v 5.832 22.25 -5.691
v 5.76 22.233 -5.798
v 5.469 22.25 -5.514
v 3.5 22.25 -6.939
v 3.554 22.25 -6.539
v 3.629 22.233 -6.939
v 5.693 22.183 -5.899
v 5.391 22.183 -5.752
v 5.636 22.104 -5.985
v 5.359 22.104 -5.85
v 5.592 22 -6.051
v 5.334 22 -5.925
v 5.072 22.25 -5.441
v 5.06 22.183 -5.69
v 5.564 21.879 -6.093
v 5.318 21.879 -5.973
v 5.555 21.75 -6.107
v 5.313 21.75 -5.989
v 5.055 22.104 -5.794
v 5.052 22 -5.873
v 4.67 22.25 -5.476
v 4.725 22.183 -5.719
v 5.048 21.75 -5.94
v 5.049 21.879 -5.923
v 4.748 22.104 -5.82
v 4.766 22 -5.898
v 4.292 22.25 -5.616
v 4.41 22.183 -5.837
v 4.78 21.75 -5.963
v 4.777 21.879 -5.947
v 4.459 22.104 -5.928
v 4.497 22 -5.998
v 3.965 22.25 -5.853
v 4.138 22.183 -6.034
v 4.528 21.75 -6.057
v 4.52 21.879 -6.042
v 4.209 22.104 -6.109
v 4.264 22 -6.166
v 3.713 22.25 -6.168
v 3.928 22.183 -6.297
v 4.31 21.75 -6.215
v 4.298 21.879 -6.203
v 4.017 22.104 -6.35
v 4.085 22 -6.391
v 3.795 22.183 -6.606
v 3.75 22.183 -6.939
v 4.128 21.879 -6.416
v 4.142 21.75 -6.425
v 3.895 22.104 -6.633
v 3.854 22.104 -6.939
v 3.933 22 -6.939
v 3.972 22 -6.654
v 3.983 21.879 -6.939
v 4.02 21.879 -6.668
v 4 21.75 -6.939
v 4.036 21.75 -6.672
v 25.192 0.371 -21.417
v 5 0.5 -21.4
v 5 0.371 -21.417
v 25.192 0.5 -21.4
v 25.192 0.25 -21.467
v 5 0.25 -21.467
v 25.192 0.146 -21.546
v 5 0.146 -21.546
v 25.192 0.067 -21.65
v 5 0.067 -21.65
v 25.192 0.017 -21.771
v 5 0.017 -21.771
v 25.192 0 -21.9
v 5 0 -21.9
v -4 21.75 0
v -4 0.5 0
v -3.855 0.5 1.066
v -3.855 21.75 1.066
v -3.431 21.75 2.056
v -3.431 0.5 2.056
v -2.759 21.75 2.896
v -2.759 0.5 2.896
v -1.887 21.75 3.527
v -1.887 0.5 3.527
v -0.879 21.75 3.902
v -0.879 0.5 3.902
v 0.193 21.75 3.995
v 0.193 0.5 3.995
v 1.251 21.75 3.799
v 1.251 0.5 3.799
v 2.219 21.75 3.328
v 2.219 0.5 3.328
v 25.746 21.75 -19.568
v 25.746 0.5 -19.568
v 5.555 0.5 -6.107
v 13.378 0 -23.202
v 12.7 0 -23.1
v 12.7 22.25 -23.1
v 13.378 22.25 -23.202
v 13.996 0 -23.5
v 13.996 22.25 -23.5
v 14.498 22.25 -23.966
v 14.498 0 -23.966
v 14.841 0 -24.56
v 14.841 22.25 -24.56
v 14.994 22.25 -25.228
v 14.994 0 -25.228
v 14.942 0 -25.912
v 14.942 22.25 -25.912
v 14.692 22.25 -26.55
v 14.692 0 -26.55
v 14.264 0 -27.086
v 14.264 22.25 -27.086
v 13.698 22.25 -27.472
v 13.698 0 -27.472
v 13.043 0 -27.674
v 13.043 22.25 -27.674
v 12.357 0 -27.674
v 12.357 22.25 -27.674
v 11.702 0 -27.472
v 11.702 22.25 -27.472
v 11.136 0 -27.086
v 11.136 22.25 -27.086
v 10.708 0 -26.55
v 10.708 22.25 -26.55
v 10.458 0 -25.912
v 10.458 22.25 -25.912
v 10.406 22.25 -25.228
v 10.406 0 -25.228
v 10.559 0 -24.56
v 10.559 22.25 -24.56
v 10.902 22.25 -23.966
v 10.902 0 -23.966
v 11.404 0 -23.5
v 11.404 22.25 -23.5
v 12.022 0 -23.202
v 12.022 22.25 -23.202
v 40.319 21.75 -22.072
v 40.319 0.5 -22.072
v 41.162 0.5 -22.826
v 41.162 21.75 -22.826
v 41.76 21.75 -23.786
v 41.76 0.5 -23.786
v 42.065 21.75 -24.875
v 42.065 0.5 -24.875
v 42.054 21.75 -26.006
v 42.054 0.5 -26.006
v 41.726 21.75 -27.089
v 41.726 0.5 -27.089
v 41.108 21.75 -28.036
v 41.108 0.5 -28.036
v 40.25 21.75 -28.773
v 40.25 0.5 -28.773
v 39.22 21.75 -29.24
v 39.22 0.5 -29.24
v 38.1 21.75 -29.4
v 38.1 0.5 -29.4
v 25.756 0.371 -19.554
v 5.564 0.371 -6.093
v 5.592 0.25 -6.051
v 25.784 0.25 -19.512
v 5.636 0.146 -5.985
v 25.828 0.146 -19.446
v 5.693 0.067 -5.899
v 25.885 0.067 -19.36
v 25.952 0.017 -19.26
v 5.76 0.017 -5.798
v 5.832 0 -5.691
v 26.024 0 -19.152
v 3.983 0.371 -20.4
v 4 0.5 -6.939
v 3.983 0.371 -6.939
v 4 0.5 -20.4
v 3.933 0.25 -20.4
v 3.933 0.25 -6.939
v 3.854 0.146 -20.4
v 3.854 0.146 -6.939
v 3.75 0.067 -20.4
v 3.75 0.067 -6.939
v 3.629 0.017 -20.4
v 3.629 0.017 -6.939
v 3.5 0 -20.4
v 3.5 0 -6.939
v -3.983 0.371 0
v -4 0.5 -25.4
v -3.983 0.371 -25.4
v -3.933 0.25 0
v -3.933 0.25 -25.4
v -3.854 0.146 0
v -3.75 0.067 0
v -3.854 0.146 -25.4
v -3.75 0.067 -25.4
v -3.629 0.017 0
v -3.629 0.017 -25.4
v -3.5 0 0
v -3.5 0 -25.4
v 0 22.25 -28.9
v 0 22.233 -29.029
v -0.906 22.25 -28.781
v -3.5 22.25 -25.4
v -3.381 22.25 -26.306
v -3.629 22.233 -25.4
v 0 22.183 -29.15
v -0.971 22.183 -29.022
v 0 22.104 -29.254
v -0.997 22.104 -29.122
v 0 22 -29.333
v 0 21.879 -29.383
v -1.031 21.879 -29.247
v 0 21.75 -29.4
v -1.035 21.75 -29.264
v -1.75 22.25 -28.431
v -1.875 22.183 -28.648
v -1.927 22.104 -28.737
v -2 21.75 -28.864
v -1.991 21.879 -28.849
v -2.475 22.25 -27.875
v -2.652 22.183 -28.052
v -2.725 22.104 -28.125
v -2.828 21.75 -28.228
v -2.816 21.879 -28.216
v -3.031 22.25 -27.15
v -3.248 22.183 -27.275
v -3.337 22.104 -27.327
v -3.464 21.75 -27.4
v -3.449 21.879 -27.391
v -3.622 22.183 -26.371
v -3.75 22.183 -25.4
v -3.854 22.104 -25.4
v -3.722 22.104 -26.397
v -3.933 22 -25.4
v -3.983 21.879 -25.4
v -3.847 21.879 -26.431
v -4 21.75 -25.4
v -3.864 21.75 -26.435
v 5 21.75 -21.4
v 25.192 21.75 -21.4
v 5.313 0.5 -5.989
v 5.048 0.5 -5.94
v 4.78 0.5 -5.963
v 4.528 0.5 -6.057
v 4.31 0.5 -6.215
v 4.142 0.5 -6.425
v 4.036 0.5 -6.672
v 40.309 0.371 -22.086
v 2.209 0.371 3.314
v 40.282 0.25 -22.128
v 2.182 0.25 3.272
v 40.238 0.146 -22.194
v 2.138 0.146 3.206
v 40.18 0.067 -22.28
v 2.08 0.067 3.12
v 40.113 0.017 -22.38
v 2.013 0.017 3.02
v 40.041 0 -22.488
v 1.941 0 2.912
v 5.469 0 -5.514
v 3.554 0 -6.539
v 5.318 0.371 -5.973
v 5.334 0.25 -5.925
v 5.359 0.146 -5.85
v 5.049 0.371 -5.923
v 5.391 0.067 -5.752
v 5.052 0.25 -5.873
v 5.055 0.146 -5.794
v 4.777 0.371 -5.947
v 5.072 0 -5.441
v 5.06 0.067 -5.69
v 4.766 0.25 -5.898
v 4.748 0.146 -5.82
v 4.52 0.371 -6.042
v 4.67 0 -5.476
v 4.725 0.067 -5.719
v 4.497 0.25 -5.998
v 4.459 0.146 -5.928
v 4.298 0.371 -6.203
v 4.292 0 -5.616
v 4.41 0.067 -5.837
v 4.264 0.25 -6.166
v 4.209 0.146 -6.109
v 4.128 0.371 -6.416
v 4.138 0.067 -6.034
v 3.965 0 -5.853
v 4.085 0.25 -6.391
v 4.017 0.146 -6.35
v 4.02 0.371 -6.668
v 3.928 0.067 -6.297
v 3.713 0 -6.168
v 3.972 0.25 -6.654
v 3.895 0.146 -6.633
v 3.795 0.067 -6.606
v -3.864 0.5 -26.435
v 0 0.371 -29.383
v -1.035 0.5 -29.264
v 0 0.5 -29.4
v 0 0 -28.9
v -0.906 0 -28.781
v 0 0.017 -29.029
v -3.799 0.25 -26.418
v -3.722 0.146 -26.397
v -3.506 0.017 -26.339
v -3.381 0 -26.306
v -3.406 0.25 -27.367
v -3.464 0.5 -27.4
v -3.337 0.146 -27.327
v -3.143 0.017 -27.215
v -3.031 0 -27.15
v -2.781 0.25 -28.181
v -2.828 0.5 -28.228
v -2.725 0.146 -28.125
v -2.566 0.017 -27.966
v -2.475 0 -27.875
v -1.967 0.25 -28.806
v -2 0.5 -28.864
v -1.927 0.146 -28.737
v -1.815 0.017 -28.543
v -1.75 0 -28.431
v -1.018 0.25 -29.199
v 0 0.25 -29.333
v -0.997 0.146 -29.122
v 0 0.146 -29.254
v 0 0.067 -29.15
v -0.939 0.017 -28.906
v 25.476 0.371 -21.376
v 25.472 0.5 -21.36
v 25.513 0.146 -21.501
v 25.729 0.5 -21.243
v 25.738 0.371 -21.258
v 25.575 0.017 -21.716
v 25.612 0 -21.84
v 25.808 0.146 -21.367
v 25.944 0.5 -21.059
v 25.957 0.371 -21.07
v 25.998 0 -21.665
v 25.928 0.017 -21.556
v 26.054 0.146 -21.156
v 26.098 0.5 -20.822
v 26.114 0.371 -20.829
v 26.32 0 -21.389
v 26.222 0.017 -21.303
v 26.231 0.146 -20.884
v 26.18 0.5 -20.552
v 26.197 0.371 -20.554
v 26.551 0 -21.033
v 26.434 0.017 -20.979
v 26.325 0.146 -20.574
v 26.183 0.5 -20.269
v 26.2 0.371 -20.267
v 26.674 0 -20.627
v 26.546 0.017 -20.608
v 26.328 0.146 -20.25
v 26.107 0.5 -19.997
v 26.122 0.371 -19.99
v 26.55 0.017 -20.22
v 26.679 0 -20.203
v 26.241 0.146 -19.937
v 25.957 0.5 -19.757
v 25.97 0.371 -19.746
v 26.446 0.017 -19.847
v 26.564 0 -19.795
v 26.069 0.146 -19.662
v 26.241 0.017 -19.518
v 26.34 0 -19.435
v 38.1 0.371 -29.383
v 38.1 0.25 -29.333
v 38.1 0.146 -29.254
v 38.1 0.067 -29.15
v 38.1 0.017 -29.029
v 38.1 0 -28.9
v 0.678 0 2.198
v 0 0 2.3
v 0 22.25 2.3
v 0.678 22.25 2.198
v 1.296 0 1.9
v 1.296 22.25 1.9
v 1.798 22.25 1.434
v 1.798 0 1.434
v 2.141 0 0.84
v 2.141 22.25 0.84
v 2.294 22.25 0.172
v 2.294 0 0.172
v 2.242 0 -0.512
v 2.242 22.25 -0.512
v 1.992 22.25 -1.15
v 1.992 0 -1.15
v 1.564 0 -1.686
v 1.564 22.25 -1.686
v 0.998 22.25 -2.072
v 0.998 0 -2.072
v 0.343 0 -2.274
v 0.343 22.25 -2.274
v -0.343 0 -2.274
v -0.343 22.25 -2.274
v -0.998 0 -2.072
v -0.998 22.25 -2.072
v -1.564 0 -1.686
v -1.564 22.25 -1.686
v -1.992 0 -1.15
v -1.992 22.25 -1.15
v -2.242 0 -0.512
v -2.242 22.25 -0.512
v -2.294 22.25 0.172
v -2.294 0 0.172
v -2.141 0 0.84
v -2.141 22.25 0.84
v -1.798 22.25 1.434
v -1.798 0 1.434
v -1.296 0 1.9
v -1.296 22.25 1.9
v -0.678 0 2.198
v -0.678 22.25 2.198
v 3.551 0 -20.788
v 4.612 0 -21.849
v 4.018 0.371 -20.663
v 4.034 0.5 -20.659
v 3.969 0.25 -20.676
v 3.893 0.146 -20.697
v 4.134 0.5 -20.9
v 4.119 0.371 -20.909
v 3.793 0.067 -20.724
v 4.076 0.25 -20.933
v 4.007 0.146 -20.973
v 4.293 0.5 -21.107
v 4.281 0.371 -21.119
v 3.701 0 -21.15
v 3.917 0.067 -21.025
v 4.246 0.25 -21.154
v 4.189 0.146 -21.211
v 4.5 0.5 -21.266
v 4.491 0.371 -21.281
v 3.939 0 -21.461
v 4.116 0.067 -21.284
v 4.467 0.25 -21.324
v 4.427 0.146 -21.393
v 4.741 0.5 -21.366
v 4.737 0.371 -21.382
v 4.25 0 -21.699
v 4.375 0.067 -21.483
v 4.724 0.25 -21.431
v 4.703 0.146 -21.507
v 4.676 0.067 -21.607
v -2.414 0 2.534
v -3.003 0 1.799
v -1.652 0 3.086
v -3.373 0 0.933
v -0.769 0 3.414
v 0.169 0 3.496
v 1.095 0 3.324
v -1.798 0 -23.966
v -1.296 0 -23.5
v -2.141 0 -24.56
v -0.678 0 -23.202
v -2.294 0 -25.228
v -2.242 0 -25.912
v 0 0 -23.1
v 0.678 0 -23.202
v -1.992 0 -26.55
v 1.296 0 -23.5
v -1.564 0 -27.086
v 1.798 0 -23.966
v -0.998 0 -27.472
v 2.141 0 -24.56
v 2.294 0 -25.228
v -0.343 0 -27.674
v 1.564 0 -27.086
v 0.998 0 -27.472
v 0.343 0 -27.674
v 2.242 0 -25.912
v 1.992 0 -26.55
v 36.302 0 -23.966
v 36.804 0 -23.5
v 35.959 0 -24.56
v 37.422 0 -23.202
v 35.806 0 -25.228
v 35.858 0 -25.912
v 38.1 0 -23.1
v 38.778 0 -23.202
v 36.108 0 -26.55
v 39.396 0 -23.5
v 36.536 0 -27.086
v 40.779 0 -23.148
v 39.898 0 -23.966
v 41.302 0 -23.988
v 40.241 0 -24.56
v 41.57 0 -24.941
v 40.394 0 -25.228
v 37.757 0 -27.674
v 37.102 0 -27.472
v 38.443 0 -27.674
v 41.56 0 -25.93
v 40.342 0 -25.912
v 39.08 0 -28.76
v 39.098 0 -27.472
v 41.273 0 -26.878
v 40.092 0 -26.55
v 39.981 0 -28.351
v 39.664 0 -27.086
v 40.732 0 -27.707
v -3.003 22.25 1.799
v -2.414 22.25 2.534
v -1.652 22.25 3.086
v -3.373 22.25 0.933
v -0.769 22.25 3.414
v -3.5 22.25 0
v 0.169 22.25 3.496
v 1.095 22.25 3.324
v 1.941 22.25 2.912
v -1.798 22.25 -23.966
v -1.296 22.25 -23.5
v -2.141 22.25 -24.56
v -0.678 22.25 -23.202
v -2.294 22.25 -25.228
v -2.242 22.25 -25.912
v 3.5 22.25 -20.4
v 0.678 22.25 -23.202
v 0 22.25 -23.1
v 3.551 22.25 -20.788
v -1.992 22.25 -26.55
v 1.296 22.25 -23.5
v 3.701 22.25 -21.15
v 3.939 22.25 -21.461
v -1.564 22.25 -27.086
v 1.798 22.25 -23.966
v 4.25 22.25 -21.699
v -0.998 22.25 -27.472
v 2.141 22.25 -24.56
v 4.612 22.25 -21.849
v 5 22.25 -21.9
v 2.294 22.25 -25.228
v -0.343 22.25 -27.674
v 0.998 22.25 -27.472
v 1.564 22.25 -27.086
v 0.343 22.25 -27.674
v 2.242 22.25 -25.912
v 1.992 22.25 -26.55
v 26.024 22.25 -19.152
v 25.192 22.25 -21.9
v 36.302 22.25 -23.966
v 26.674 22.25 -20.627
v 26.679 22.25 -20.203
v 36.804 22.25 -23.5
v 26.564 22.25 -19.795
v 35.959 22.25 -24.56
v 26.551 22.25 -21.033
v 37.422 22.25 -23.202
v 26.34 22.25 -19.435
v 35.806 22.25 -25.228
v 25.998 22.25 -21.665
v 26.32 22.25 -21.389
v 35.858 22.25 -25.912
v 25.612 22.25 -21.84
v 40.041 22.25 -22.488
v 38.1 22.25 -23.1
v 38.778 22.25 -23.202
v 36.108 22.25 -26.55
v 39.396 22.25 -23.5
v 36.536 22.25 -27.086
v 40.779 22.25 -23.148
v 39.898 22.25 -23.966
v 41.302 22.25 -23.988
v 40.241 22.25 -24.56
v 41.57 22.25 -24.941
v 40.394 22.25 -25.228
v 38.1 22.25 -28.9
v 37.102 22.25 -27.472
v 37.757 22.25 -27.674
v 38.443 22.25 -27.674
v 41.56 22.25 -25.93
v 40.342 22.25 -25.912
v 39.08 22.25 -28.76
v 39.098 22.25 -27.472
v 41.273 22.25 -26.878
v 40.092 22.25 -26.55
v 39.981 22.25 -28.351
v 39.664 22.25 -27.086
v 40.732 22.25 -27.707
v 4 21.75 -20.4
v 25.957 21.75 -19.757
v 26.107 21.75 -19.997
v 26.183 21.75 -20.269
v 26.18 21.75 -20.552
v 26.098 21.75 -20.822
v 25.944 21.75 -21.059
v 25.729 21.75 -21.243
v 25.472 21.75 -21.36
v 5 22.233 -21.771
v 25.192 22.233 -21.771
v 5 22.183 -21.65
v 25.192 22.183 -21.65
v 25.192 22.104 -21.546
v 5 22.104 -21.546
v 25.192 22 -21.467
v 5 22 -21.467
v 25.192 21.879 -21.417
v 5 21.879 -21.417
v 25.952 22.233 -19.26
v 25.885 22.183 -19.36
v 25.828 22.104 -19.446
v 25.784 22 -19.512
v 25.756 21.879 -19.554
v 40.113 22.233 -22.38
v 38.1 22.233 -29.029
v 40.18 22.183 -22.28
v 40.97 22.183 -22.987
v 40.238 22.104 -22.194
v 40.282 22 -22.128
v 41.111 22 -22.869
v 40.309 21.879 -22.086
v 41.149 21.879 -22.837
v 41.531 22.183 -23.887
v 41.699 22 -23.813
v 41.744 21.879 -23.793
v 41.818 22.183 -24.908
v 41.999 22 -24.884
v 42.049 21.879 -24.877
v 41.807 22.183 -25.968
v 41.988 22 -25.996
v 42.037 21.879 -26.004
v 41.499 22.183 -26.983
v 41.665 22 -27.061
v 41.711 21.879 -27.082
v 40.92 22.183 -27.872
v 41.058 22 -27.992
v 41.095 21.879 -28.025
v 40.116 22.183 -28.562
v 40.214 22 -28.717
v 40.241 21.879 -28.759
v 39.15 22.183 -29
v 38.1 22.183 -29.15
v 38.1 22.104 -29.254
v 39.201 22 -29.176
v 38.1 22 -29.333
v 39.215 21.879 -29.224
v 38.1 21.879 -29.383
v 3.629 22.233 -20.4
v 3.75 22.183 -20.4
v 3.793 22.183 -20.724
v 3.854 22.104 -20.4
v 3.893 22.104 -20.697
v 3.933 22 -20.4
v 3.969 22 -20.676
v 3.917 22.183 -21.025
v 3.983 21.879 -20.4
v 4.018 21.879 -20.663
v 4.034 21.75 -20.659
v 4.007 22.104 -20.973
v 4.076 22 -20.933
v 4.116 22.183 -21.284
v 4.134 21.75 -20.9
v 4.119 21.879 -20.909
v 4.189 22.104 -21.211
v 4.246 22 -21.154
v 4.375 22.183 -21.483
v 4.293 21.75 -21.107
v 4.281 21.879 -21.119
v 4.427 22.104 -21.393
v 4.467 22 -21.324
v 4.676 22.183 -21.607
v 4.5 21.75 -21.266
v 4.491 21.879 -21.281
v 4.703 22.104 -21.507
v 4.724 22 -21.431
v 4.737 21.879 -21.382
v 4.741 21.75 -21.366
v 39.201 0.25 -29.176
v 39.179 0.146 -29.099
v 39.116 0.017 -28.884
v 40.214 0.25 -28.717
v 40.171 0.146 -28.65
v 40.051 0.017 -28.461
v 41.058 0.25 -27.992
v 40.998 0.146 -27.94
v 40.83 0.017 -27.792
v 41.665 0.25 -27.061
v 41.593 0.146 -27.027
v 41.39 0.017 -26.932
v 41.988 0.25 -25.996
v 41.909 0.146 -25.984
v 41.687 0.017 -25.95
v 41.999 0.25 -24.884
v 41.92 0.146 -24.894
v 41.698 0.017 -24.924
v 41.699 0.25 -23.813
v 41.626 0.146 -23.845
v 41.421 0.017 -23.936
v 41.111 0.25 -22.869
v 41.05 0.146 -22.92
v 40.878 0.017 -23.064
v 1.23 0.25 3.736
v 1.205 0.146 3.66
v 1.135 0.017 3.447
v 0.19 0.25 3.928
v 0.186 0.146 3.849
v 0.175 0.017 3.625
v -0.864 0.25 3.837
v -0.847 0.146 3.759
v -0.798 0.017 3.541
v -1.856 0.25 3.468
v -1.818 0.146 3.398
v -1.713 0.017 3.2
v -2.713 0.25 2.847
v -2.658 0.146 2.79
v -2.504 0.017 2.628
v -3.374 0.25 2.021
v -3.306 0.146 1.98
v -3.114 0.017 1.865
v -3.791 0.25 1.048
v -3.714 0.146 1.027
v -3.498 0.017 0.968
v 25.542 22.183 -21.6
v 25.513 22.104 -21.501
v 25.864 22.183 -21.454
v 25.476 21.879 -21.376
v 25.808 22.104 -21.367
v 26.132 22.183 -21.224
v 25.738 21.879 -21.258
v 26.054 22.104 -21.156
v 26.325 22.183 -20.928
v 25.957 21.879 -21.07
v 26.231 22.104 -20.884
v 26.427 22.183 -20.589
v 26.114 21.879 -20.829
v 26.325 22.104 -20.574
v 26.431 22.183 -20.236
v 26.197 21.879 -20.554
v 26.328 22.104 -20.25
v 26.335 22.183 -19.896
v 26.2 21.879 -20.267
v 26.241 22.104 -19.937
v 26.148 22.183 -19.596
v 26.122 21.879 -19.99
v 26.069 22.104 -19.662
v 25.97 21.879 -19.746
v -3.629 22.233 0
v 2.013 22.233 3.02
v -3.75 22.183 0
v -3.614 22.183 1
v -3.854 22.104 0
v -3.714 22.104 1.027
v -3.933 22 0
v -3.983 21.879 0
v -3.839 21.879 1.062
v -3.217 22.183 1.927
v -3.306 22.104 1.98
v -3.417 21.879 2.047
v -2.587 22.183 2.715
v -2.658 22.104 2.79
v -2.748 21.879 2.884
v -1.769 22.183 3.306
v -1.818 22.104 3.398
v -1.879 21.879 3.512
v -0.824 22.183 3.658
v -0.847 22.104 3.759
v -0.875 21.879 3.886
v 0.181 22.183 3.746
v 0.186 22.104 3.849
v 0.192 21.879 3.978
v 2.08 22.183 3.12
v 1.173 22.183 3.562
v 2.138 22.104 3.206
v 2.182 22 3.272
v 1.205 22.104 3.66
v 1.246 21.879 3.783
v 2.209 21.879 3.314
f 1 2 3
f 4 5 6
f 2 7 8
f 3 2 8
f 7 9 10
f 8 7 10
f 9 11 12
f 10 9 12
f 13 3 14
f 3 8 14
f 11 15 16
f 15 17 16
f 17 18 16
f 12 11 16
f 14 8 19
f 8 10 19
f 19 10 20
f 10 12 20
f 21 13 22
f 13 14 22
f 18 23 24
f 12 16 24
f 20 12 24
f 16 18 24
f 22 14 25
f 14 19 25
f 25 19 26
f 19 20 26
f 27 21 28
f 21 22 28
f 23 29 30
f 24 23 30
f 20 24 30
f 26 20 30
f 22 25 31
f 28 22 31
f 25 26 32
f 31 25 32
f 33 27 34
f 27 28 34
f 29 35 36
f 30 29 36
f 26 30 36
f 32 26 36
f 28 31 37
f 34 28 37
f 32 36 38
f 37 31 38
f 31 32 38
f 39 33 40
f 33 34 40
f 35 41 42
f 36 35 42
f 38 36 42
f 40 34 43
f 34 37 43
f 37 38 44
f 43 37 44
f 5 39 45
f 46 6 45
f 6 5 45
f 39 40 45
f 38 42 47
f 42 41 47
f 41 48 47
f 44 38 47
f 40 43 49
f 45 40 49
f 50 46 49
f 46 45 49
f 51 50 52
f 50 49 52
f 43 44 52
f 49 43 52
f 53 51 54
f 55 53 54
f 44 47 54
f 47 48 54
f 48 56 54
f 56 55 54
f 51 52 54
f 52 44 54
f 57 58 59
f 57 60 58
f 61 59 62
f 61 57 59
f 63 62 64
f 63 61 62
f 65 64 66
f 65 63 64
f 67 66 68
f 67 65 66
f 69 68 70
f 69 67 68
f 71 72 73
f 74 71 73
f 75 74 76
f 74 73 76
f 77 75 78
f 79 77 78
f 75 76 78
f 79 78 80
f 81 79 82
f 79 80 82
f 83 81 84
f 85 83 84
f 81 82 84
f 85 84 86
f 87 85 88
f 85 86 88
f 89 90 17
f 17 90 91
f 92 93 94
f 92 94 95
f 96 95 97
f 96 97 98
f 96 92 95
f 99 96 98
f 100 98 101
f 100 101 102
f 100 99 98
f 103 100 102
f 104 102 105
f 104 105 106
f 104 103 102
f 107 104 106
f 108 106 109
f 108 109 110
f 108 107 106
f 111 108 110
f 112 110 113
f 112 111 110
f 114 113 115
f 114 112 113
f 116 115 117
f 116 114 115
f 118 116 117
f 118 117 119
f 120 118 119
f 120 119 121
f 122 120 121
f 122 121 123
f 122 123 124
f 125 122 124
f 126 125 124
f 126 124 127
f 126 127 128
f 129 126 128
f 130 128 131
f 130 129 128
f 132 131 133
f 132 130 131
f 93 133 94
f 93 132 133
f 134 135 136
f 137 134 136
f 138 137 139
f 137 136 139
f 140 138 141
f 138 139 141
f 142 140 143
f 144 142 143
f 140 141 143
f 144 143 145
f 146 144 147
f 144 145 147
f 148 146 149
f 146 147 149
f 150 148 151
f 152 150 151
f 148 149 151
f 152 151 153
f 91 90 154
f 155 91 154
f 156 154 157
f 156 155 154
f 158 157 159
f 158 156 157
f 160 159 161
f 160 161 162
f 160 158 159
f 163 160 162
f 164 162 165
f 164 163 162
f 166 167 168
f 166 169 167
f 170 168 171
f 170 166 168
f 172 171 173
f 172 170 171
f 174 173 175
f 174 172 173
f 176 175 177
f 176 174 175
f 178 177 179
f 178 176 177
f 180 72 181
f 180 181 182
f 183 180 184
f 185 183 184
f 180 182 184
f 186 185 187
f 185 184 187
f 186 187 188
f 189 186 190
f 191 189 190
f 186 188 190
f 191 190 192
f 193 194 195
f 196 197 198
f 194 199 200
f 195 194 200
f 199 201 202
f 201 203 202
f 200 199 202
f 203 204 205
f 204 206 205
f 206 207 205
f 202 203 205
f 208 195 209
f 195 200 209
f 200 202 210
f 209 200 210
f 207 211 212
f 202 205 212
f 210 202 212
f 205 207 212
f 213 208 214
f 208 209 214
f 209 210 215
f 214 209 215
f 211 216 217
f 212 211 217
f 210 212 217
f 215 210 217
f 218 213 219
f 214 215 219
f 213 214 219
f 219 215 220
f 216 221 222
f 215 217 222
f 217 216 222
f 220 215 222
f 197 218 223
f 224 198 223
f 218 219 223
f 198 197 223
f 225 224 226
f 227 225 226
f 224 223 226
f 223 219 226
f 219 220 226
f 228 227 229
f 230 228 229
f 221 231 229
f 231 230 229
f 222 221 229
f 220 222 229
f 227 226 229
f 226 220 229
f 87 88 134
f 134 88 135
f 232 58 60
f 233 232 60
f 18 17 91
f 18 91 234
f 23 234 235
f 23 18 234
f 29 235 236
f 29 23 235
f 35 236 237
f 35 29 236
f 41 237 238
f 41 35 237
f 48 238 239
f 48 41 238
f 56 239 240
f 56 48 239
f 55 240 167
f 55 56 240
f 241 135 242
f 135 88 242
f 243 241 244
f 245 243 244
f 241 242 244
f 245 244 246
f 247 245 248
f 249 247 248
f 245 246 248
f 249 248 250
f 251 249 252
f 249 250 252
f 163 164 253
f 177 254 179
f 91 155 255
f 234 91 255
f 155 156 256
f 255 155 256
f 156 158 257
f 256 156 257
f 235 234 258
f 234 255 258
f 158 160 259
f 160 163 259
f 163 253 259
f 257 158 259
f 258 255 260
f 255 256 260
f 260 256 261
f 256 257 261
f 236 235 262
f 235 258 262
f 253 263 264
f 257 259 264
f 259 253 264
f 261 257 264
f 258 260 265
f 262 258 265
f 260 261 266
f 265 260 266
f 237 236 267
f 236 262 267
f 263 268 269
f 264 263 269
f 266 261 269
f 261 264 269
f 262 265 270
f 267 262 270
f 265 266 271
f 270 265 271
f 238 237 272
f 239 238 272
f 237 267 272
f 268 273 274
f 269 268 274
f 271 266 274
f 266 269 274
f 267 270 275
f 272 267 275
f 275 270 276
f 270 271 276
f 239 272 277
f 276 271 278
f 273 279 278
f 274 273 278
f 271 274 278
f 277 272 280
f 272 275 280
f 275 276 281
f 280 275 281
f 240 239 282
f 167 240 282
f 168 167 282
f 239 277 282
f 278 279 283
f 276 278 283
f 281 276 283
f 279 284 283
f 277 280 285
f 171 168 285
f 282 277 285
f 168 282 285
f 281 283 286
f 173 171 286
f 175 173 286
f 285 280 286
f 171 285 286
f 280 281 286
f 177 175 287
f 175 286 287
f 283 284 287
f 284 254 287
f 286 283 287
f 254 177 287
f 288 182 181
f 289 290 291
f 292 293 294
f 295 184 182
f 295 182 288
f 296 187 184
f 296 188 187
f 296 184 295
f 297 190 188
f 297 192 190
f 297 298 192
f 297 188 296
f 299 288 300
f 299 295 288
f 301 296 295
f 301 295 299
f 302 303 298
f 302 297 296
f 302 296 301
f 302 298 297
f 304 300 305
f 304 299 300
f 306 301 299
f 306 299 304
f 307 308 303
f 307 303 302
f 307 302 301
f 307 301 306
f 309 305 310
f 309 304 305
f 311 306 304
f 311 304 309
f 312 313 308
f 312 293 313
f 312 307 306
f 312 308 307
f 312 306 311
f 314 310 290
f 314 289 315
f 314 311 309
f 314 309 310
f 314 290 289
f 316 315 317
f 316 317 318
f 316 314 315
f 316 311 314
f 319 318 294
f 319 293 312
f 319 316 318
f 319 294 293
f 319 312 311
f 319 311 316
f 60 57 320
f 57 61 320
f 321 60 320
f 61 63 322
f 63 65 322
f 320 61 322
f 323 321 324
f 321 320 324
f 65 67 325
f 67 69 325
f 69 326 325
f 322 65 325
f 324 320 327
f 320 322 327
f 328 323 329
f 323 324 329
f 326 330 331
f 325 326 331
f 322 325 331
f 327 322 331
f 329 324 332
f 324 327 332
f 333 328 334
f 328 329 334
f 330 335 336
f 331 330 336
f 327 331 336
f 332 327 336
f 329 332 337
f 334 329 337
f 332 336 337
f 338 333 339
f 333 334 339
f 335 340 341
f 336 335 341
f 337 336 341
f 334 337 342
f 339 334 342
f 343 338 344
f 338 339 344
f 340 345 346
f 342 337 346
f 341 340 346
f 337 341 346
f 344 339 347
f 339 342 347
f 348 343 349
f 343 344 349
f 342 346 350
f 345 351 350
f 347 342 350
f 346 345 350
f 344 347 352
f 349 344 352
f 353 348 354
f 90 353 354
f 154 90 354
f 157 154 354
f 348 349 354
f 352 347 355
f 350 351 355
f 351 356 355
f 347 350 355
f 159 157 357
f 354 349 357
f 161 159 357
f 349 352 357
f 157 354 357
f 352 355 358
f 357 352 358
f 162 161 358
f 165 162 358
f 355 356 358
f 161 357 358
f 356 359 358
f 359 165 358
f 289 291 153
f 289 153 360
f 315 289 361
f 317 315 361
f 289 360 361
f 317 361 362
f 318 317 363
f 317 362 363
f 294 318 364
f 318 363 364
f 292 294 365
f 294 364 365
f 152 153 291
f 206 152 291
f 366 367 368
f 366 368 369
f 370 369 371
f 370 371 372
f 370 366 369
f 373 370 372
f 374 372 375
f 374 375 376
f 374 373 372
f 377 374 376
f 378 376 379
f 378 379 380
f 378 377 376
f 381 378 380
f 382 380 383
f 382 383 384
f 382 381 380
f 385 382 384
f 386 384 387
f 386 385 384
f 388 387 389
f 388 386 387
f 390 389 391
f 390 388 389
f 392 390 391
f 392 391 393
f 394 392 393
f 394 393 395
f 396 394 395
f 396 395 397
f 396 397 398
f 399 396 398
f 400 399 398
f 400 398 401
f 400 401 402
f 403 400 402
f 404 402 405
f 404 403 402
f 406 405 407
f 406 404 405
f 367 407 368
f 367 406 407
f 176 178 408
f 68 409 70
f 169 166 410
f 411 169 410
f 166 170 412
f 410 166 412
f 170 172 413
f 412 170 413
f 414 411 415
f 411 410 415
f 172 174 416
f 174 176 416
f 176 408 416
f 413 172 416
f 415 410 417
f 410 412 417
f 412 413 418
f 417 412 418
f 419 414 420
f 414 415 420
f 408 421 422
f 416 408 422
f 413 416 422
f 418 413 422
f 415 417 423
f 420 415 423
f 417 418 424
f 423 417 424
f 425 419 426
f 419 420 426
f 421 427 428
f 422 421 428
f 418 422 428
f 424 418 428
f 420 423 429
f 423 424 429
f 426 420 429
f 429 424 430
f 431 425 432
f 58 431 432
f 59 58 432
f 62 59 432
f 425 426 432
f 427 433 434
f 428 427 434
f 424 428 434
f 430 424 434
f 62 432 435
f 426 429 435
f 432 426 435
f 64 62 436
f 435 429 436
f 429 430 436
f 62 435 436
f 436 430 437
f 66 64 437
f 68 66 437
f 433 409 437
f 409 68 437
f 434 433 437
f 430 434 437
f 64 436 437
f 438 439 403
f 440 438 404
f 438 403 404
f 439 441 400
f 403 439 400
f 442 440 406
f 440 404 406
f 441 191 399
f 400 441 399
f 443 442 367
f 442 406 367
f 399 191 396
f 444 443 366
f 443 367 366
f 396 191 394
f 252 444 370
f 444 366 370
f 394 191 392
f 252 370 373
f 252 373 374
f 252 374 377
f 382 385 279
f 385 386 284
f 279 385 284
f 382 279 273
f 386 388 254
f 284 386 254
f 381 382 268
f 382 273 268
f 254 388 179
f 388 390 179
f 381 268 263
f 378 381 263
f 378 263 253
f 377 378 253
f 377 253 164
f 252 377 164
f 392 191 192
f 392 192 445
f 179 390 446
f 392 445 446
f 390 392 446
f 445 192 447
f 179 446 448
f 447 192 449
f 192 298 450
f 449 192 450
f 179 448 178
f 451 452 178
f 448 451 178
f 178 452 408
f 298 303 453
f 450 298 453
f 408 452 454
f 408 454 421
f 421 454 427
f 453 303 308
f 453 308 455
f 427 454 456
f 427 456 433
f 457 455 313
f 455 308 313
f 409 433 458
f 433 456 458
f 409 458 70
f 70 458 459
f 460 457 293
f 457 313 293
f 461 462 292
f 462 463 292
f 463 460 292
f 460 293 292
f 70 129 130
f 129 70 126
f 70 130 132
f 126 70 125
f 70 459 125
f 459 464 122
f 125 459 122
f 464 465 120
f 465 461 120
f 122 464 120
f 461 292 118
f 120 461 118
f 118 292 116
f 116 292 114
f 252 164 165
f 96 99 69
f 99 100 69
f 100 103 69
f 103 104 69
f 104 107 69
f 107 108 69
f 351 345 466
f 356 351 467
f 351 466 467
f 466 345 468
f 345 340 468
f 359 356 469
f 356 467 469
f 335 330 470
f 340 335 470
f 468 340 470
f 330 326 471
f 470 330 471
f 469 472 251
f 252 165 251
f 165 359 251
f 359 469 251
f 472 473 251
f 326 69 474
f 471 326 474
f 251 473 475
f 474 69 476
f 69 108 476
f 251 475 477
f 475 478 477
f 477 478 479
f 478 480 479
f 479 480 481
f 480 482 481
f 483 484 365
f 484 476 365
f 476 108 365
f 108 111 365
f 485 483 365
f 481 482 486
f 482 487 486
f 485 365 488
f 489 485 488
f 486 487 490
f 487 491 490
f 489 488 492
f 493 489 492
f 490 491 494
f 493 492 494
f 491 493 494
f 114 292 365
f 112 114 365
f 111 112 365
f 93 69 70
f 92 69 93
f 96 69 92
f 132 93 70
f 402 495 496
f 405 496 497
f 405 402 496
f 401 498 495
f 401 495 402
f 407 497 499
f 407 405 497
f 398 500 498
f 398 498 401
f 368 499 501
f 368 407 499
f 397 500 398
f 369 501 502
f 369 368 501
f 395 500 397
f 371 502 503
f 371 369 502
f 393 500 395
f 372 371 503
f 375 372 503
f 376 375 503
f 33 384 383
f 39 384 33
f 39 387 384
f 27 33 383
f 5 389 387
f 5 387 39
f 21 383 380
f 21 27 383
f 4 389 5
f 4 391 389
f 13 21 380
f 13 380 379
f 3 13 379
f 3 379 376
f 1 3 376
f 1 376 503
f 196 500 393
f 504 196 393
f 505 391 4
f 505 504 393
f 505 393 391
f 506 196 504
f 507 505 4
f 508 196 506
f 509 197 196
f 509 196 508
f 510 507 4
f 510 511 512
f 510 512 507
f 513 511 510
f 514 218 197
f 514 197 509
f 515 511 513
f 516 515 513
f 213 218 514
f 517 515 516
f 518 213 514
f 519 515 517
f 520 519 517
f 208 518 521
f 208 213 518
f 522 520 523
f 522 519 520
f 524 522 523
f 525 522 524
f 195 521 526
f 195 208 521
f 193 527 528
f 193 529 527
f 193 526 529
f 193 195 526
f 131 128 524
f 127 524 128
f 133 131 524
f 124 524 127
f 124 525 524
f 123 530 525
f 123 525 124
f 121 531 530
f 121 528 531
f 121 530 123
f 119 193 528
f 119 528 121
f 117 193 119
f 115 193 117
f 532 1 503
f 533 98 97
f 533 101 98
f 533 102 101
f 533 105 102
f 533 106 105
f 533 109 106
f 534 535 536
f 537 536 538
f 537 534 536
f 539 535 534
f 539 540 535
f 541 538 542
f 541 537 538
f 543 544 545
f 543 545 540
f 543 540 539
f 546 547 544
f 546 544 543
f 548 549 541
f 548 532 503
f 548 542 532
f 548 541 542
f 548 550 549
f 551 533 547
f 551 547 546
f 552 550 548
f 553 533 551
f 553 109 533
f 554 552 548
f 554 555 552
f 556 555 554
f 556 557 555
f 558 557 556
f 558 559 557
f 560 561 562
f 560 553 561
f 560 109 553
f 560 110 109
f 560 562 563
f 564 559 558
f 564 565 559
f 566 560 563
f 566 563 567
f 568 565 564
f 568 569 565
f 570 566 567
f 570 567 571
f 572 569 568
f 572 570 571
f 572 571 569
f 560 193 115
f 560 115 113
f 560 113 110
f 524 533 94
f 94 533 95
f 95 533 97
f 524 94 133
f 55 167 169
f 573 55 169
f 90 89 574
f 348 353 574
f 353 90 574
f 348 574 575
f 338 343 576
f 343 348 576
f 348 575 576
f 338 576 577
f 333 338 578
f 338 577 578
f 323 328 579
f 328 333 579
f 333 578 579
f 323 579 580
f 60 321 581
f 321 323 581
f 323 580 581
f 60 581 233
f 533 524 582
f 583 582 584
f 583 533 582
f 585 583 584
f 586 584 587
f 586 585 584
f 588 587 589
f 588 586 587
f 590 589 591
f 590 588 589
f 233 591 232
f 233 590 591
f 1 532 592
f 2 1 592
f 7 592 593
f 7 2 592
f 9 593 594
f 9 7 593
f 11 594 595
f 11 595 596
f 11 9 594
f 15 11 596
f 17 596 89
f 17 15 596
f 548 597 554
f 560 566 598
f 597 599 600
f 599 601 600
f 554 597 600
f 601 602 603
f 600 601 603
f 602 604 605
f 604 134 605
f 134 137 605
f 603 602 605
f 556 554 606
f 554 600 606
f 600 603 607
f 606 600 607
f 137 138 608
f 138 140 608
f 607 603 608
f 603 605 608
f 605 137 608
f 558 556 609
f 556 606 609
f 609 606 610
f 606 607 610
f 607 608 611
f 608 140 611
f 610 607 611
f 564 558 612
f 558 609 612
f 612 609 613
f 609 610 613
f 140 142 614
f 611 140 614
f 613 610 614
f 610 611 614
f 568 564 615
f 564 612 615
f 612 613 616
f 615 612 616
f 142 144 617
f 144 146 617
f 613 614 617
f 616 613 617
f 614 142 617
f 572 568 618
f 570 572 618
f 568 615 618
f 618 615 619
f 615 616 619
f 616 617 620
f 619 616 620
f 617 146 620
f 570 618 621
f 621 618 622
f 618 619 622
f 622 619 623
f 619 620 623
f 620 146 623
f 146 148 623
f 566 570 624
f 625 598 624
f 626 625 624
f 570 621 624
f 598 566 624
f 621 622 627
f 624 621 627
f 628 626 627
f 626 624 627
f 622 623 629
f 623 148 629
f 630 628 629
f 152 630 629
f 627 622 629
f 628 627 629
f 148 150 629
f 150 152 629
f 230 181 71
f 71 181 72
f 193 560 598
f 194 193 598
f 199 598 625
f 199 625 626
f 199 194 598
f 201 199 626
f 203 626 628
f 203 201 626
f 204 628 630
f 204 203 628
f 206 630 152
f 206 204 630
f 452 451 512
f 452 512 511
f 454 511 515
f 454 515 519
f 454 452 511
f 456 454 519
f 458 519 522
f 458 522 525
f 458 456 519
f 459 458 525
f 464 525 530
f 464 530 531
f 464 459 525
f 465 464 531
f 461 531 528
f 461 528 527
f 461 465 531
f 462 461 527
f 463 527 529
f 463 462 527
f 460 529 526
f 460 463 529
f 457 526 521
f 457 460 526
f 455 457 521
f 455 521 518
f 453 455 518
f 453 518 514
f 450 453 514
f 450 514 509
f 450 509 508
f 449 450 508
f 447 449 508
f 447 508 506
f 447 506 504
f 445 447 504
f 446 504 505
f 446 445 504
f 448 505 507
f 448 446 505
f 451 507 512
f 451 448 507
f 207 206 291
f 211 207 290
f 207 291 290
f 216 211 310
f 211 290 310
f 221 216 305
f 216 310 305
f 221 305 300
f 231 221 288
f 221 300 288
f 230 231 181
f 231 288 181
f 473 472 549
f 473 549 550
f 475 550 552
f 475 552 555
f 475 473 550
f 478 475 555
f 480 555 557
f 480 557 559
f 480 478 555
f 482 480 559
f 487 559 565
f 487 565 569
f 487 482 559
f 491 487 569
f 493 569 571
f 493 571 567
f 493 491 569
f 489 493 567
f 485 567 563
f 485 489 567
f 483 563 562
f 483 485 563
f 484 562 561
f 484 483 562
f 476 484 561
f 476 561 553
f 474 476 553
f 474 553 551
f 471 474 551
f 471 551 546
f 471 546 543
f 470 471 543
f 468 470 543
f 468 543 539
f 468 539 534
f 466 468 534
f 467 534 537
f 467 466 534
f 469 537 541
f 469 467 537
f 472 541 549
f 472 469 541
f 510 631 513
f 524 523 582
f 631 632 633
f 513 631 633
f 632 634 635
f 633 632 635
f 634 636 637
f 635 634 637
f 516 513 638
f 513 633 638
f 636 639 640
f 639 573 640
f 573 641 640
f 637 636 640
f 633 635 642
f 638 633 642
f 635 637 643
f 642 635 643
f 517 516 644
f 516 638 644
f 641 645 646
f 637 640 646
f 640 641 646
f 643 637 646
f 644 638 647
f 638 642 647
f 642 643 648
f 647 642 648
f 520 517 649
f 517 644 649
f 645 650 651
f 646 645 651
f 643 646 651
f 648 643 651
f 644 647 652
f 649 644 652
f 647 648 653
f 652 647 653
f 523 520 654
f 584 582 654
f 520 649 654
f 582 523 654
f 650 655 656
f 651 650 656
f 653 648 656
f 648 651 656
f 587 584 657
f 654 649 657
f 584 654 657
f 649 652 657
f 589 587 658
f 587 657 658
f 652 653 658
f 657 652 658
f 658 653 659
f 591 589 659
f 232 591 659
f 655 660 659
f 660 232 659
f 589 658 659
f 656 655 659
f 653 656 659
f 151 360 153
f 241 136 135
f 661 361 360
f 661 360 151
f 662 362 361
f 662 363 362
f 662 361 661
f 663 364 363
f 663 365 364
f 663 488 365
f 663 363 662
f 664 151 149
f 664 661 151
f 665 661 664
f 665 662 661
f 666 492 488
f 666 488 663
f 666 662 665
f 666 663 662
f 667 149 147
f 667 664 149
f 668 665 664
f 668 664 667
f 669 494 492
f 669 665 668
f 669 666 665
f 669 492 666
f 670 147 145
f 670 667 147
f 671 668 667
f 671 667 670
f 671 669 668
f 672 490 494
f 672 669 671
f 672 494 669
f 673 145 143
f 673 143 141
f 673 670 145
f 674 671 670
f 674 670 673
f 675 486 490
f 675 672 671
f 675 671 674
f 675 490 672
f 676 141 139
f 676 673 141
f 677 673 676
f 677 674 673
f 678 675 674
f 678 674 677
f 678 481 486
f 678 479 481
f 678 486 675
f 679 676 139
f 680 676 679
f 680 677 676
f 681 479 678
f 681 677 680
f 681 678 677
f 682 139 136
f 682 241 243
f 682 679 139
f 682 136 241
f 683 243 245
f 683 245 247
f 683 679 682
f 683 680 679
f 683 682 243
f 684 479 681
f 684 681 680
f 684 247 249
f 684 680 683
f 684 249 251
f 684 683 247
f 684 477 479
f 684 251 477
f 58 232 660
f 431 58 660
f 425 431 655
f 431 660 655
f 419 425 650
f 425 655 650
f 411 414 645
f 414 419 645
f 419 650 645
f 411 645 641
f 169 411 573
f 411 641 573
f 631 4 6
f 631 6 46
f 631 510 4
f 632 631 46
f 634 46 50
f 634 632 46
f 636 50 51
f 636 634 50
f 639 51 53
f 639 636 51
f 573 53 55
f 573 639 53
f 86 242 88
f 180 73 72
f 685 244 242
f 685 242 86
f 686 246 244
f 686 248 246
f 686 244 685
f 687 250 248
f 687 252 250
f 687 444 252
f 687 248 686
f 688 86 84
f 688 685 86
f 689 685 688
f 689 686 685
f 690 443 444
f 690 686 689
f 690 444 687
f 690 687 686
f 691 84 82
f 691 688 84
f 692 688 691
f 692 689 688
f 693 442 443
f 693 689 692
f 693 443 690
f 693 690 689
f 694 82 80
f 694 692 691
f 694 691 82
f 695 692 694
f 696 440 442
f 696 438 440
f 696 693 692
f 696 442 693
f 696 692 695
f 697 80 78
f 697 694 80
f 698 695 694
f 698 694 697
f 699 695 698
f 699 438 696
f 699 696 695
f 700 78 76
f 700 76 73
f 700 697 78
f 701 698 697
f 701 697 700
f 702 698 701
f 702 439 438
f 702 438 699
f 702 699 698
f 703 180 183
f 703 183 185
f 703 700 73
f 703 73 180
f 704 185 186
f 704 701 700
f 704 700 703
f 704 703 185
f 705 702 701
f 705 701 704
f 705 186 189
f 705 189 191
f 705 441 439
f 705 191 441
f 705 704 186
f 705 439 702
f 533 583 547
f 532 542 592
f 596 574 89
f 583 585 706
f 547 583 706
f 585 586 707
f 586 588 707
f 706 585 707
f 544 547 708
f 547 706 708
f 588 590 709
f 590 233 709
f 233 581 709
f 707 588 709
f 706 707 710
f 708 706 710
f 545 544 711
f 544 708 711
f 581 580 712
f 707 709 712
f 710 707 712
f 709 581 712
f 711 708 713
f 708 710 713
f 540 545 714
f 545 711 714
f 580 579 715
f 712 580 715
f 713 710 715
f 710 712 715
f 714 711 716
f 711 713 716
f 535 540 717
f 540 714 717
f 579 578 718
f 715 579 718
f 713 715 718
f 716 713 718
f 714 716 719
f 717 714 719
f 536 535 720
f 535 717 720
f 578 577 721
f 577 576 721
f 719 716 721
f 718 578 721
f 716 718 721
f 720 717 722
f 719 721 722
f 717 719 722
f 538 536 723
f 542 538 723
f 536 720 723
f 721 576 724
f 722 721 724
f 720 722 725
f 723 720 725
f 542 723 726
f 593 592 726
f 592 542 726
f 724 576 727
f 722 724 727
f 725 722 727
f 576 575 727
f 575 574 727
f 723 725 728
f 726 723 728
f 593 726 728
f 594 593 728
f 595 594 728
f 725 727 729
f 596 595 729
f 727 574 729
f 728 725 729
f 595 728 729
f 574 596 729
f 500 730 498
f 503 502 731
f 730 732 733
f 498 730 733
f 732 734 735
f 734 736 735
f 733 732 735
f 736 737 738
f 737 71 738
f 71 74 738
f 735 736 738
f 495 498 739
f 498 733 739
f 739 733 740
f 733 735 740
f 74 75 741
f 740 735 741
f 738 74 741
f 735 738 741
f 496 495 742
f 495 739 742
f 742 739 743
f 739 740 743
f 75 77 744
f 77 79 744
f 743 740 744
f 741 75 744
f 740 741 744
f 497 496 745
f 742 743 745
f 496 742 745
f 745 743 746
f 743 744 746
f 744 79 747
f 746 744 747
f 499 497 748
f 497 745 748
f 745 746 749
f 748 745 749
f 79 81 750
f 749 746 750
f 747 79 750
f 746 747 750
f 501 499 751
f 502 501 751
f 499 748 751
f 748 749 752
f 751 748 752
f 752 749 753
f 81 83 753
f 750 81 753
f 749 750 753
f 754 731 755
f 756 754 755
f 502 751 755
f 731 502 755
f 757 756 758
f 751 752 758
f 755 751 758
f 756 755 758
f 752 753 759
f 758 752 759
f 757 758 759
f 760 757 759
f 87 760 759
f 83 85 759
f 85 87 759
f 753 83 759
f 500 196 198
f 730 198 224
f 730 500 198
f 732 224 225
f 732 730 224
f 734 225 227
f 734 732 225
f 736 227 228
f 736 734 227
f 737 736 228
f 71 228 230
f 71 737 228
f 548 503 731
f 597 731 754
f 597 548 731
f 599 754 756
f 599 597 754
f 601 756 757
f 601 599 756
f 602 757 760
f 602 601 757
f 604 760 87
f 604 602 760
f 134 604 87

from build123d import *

# Parameters (mm, degrees)
SKETCH1_R           = 2.3
SKETCH1_R_2         = 4
BOSS_EXTRUDE1_DEPTH = 22.25
FILLET1_R           = 1
FILLET2_R           = 0.5


with BuildPart() as part:
    # Sketch1 → Boss-Extrude1 (new body)
    # profile 1 of 4: a face of its own
    with BuildSketch(Plane(origin=(0, 0, 0), x_dir=(1, 0, 0), z_dir=(0, 1, 0))):
        with BuildLine():
            ThreePointArc((4, 25.4), (0, 21.4), (-4, 25.4))
            Line((-4, 25.4), (-4, 0))
            ThreePointArc((-4, 0), (0, 4), (4, 0))
            ThreePointArc((4, 0), (3.526698395, -1.887431702), (2.218800785, -3.328201177))
            Line((2.218800785, -3.328201177), (40.318800785, 22.071798823))
            ThreePointArc((40.318800785, 22.071798823), (34.271631894, 24.240863405), (38.1, 29.4))
            Line((38.1, 29.4), (0, 29.4))
            ThreePointArc((0, 29.4), (2.828427125, 28.228427125), (4, 25.4))
        make_face()
        Polygon((4, 5.070367517), (4, 21.4), (28.494448725, 21.4), align=None, mode=Mode.SUBTRACT)
        with Locations(Location((12.7, 25.4, 0), (0, 0, 270))):
            Circle(SKETCH1_R, mode=Mode.SUBTRACT)
    # profile 2 of 4: a face of its own
    with BuildSketch(Plane(origin=(0, 0, 0), x_dir=(1, 0, 0), z_dir=(0, 1, 0))):
        Circle(SKETCH1_R_2)
        with Locations(Location((0, 0, 0), (0, 0, 270))):
            Circle(SKETCH1_R, mode=Mode.SUBTRACT)
    # profile 3 of 4: a face of its own
    with BuildSketch(Plane(origin=(0, 0, 0), x_dir=(1, 0, 0), z_dir=(0, 1, 0))):
        with Locations((38.1, 25.4)):
            Circle(SKETCH1_R_2)
        with Locations(Location((38.1, 25.4, 0), (0, 0, 270))):
            Circle(SKETCH1_R, mode=Mode.SUBTRACT)
    # profile 4 of 4: a face of its own
    with BuildSketch(Plane(origin=(0, 0, 0), x_dir=(1, 0, 0), z_dir=(0, 1, 0))):
        with Locations((0, 25.4)):
            Circle(SKETCH1_R_2)
        with Locations(Location((0, 25.4, 0), (0, 0, 270))):
            Circle(SKETCH1_R, mode=Mode.SUBTRACT)
    extrude(amount=BOSS_EXTRUDE1_DEPTH)

    # Fillet1
    fillet1_edges = [part.edges().sort_by_distance(p)[0] for p in [
        (4, 11.125, -21.4),
        (4, 11.125, -5.070367517),
        (28.494448725, 11.125, -21.4),
    ]]
    fillet(fillet1_edges, radius=FILLET1_R)

    # Fillet2
    fillet2_edges = [part.edges().sort_by_distance(p)[0] for p in [
        (19.05, 22.25, -29.4),
        (-2.828427125, 22.25, -28.228427125),
        (41.928368106, 0, -26.559136595),
        (21.268800785, 0, -9.371798823),
        (-4, 22.25, -12.7),
        (-1.887431702, 0, 3.526698395),
        (-4, 0, -12.7),
        (-2.828427125, 0, -28.228427125),
        (19.05, 0, -29.4),
        (-1.887431702, 22.25, 3.526698395),
        (21.268800785, 22.25, -9.371798823),
        (41.928368106, 22.25, -26.559136595),
        (15.65053674, 0, -12.83739201),
        (15.65053674, 22.25, -12.83739201),
        (15.095836543, 0, -21.4),
        (15.095836543, 22.25, -21.4),
        (4, 0, -13.669442304),
        (4, 22.25, -13.669442304),
        (26.148765113, 0, -20.689784149),
        (26.148765113, 22.25, -20.689784149),
        (4.528142074, 0, -6.05721001),
        (4.528142074, 22.25, -6.05721001),
        (4.292893219, 0, -21.107106781),
        (4.292893219, 22.25, -21.107106781),
    ]]
    fillet(fillet2_edges, radius=FILLET2_R)


solid = part.part
